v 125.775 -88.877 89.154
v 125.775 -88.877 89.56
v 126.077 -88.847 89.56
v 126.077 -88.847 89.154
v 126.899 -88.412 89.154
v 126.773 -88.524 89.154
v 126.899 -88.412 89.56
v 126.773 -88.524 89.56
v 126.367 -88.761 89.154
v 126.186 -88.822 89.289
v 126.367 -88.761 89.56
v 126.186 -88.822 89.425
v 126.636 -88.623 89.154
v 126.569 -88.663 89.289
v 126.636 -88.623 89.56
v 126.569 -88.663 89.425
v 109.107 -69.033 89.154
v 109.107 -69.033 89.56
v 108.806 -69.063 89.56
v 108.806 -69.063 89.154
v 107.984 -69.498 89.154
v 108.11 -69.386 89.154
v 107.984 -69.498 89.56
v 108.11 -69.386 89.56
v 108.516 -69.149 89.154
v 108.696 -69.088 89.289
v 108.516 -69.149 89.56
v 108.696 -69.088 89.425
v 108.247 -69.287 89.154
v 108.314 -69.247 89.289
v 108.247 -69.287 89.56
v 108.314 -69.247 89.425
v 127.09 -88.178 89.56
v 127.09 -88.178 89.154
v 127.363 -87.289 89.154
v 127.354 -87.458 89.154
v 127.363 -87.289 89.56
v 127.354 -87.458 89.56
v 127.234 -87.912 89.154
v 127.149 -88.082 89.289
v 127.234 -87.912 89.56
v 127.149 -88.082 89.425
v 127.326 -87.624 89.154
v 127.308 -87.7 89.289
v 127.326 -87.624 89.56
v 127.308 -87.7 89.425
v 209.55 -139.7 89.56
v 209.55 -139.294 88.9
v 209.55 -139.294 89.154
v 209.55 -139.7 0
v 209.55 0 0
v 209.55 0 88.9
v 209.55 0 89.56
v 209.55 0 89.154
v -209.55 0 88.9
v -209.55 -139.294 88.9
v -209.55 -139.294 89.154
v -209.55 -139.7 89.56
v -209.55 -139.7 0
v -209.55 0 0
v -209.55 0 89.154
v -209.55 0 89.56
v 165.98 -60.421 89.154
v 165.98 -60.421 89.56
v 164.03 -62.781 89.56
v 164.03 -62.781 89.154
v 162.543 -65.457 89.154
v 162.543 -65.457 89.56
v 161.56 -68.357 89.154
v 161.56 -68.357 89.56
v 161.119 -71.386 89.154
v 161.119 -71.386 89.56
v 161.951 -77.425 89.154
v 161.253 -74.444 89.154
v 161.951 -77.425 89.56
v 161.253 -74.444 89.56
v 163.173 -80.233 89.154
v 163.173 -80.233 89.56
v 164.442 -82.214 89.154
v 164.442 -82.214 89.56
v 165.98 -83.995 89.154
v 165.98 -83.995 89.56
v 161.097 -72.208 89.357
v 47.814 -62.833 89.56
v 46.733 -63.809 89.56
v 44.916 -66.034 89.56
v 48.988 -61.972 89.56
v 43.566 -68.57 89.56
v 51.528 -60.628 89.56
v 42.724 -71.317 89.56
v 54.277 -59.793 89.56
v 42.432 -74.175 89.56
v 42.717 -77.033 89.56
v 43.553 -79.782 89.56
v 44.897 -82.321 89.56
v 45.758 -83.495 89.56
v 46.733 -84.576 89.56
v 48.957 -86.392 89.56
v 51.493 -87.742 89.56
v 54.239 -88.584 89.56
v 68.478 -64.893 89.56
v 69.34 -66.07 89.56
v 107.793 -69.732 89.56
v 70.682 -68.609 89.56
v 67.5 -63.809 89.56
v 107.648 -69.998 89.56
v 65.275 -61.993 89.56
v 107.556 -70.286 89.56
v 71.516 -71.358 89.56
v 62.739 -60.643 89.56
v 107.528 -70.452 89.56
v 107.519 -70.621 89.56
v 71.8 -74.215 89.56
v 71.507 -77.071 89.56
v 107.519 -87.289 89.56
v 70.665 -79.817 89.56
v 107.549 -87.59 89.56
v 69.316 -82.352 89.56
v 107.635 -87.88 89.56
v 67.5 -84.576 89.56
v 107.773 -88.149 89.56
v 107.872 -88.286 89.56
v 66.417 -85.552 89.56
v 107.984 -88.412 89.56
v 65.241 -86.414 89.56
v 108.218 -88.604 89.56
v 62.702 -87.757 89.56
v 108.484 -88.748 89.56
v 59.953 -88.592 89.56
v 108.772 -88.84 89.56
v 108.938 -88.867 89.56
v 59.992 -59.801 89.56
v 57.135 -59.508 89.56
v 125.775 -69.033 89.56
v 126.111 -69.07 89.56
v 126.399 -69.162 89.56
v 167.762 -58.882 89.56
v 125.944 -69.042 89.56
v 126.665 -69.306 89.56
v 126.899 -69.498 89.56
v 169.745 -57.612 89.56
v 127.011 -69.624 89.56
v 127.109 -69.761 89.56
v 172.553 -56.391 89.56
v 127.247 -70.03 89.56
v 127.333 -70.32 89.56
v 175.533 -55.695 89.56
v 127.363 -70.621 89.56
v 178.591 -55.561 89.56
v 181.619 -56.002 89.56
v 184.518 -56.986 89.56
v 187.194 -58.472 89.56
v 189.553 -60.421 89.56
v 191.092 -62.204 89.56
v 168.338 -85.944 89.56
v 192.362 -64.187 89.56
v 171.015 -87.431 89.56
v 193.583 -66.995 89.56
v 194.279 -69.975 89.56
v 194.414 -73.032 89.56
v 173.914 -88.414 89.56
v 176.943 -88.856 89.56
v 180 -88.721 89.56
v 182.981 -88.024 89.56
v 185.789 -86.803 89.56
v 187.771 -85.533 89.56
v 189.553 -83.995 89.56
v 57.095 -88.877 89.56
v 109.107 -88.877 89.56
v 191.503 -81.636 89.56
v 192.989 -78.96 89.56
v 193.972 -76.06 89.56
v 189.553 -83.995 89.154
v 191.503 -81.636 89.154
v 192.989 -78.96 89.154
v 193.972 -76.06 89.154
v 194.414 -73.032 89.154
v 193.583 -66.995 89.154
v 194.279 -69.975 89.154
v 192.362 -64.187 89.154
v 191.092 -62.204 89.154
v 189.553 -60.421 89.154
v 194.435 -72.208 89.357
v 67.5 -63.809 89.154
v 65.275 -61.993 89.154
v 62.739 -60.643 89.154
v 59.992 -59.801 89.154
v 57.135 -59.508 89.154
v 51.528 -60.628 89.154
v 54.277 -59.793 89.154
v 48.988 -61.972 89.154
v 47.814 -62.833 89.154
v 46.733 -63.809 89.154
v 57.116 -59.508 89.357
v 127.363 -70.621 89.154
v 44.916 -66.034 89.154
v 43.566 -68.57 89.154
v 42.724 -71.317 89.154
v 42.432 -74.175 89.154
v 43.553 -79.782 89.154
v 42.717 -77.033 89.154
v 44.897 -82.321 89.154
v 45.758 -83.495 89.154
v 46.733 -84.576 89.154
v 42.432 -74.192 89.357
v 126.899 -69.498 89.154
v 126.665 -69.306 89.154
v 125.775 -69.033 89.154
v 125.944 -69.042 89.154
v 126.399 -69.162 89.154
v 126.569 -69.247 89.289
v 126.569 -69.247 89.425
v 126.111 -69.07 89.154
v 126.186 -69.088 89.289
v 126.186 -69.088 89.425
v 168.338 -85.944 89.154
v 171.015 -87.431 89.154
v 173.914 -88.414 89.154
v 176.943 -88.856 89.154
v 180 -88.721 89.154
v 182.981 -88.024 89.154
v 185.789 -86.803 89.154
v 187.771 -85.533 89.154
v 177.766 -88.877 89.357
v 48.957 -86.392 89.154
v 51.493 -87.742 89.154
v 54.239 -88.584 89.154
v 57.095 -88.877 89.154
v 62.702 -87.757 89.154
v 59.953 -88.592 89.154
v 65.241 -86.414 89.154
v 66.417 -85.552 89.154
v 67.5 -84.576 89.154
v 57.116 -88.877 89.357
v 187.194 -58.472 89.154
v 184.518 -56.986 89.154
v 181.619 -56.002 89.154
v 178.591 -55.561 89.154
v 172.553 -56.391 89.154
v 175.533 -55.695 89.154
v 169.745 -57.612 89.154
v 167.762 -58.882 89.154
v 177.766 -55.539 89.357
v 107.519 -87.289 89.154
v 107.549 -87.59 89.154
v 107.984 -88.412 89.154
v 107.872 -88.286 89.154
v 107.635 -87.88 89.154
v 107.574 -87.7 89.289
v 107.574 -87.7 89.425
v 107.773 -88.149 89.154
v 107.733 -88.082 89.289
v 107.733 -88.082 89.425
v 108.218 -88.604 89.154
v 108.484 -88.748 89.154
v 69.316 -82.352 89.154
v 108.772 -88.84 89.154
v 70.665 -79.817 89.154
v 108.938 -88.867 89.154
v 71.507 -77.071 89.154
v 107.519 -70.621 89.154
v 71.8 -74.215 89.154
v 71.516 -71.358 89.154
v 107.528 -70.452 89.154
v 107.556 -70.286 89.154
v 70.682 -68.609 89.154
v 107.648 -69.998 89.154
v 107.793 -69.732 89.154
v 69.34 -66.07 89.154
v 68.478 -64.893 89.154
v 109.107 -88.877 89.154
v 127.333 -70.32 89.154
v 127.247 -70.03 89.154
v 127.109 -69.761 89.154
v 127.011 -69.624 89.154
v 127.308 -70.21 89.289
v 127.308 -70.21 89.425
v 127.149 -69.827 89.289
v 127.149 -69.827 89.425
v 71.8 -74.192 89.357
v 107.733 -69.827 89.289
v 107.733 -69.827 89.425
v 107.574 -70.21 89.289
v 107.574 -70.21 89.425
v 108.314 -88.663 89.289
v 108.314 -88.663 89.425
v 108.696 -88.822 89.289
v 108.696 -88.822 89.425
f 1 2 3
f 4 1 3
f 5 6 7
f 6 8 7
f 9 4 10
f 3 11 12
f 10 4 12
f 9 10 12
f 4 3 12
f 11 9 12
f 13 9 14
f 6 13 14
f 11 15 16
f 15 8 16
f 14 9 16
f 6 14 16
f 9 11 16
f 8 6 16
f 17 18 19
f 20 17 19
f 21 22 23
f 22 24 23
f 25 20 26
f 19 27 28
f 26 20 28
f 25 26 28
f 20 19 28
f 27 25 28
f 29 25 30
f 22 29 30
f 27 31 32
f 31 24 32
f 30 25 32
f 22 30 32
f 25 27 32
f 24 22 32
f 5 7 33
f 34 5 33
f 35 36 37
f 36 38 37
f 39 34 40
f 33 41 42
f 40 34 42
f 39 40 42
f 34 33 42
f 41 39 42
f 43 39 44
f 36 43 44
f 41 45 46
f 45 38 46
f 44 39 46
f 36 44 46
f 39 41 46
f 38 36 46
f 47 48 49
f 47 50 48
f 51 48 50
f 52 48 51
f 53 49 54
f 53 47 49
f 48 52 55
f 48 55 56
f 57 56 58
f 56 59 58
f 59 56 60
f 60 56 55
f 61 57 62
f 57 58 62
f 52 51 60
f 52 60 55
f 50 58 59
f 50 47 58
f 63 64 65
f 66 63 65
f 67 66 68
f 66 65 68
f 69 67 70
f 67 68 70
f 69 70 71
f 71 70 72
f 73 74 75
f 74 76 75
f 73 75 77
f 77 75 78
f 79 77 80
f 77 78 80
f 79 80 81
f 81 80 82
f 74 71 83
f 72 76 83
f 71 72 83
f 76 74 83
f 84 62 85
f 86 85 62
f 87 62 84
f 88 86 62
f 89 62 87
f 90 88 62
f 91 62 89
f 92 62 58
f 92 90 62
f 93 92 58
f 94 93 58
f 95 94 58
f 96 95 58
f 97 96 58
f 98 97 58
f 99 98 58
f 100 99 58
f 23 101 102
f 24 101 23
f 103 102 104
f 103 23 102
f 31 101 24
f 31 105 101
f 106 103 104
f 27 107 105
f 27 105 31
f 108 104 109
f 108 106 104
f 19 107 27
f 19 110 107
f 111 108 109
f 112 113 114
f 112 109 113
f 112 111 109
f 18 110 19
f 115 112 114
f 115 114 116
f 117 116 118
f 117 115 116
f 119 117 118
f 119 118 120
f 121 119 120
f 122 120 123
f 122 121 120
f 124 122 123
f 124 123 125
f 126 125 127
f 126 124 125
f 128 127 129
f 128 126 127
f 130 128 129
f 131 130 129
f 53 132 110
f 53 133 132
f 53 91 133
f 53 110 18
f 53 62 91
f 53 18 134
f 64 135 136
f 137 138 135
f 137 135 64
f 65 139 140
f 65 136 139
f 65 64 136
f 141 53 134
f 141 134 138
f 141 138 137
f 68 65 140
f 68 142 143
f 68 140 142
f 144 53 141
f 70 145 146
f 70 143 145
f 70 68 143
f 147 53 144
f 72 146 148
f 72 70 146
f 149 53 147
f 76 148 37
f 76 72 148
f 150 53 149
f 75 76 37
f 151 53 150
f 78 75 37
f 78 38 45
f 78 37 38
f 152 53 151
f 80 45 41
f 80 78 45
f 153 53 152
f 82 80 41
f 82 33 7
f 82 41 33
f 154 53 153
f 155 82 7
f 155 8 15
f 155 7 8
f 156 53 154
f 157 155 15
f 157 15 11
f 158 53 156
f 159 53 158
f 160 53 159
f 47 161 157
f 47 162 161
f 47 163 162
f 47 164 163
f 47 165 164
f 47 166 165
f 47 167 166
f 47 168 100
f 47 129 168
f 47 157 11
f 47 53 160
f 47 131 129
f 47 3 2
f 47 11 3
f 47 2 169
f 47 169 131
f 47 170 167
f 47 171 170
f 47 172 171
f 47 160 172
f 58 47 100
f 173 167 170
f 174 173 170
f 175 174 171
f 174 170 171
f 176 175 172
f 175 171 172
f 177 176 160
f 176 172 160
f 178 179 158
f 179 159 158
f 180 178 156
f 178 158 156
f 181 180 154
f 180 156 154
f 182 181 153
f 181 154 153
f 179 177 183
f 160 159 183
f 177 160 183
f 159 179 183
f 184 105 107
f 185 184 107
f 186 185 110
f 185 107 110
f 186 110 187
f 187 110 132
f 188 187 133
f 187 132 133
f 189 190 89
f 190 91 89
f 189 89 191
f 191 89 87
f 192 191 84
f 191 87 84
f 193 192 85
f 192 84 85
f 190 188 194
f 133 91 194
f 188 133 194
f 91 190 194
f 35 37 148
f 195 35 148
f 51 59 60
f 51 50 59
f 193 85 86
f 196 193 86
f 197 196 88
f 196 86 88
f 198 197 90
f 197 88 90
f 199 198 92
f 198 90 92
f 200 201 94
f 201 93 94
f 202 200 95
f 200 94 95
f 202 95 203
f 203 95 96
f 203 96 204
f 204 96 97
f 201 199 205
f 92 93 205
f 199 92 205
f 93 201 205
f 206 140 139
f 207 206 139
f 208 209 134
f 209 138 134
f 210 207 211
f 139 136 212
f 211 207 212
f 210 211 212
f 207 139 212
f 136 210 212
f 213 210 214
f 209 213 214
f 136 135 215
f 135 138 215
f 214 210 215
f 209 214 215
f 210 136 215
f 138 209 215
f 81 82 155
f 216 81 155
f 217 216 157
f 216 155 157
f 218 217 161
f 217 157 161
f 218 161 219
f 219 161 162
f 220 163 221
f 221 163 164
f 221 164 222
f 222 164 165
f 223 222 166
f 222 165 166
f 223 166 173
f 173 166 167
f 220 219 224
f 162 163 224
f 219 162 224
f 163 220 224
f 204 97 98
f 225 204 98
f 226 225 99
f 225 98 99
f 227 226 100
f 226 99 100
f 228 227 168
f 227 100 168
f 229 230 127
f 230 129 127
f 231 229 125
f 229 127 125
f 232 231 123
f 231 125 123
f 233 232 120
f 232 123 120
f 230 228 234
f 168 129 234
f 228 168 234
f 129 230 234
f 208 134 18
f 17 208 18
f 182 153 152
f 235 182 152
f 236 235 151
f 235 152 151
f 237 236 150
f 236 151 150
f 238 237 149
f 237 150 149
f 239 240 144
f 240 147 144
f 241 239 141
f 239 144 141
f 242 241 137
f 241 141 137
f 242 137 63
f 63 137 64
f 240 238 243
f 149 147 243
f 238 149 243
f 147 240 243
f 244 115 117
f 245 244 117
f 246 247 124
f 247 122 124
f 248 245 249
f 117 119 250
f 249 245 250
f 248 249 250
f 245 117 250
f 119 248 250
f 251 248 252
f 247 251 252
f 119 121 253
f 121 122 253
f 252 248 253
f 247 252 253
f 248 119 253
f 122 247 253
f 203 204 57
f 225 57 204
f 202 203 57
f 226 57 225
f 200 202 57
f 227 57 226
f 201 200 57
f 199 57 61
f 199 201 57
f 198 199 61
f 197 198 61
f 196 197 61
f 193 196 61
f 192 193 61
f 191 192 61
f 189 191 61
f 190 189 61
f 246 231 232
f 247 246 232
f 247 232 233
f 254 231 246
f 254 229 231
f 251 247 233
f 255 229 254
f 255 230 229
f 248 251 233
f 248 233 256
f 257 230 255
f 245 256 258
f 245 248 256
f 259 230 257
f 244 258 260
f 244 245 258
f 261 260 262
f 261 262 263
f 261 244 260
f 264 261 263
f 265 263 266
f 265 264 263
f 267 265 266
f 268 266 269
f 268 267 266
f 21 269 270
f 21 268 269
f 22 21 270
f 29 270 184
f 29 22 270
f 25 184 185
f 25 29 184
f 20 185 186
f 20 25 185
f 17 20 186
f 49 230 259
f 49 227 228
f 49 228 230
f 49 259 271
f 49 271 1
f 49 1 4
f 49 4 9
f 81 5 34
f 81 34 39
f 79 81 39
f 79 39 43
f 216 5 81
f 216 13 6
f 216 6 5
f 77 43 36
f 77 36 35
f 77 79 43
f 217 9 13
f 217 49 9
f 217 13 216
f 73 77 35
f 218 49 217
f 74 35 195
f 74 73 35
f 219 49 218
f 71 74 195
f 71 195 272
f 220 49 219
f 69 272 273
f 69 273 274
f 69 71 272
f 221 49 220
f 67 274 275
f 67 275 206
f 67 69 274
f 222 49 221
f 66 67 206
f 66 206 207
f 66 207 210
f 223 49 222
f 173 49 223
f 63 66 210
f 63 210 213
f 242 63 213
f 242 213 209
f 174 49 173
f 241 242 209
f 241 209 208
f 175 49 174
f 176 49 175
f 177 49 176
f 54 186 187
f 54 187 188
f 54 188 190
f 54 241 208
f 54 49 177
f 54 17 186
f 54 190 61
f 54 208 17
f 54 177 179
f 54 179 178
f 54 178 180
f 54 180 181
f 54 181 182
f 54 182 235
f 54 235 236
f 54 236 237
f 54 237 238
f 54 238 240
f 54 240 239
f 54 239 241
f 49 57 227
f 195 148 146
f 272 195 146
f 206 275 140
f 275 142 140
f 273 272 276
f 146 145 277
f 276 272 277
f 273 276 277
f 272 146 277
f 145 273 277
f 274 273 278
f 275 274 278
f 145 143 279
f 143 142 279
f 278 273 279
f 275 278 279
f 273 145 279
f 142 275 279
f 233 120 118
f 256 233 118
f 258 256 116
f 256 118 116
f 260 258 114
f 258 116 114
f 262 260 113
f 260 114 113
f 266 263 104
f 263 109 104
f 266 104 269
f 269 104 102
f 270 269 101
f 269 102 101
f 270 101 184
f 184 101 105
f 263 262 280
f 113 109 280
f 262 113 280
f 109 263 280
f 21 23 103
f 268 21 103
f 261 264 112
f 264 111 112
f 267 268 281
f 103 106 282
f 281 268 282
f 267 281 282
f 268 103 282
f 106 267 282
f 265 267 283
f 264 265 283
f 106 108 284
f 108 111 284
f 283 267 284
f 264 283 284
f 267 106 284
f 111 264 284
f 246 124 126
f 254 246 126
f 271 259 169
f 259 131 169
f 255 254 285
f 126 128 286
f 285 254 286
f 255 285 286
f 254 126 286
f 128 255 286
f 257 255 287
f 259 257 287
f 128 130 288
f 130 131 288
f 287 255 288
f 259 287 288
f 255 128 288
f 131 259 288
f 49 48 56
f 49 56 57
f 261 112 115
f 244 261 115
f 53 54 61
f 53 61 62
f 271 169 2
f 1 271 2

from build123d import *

# Parameters (mm, degrees)
F1_DEPTH = 209.55
F3_DEPTH = 0.4064


# Not quite as in the source:
# - the dataset's text gives a spline's control points without its knots; the knots are read off the source's solid


with BuildPart() as f1:
    # F0 (on Right) → F1 (new body, symmetric)
    with BuildSketch(Plane.YZ):
        Polygon((-139.7, 0), (0, 0), (0, 88.9), (-139.2936, 88.9), (-139.2936, 89.154), (0, 89.154), (0, 89.5604), (-139.7, 89.5604), align=None)
    extrude(amount=F1_DEPTH, both=True)

    # F2 (on face) → F3 (cut, through all)
    with BuildSketch(Plane.XY.offset(89.5604)):
        with BuildLine():
            add(Edge.make_bspline(
                [(107.984345256, -69.4981747566), (107.690467256, -69.7918495566), (107.519068056, -70.2049297566), (107.519068056, -70.6205499566)],
                knots=[1, 1, 1, 1, 2, 2, 2, 2], degree=3))
            Line((107.519068056, -70.6205499566), (107.519068056, -87.2892999566))
            add(Edge.make_bspline(
                [(107.519068056, -87.2892999566), (107.519068056, -87.7047677566), (107.690467256, -88.1178479566), (107.984345256, -88.4117005566)],
                knots=[0, 0, 0, 0, 1, 1, 1, 1], degree=3))
            add(Edge.make_bspline(
                [(107.984345256, -88.4117005566), (108.278197856, -88.7055785566), (108.691278056, -88.8767999566), (109.106568056, -88.8767999566)],
                knots=[1, 1, 1, 1, 2, 2, 2, 2], degree=3))
            Line((109.106568056, -88.8767999566), (125.775318056, -88.8767999566))
            add(Edge.make_bspline(
                [(125.775318056, -88.8767999566), (126.191649456, -88.8767999566), (126.604374056, -88.7055785566), (126.898582256, -88.4117005566)],
                knots=[0, 0, 0, 0, 1, 1, 1, 1], degree=3))
            add(Edge.make_bspline(
                [(126.898582256, -88.4117005566), (127.192130056, -88.1178479566), (127.362818056, -87.7047677566), (127.362818056, -87.2892999566)],
                knots=[1, 1, 1, 1, 2, 2, 2, 2], degree=3))
            Line((127.362818056, -87.2892999566), (127.362818056, -70.6205499566))
            add(Edge.make_bspline(
                [(127.362818056, -70.6205499566), (127.362818056, -70.2049297566), (127.192130056, -69.7918495566), (126.898582256, -69.4981747566)],
                knots=[0, 0, 0, 0, 1, 1, 1, 1], degree=3))
            add(Edge.make_bspline(
                [(126.898582256, -69.4981747566), (126.604374056, -69.2041189566), (126.191649456, -69.0330499566), (125.775318056, -69.0330499566)],
                knots=[1, 1, 1, 1, 2, 2, 2, 2], degree=3))
            Line((125.775318056, -69.0330499566), (109.106568056, -69.0330499566))
            add(Edge.make_bspline(
                [(109.106568056, -69.0330499566), (108.691278056, -69.0330499566), (108.278197856, -69.2041189566), (107.984345256, -69.4981747566)],
                knots=[0, 0, 0, 0, 1, 1, 1, 1], degree=3))
        make_face()
        with BuildLine():
            add(Edge.make_bspline(
                [(67.499971056, -63.8087525566), (64.781434456, -61.0905461566), (60.960512456, -59.5080753566), (57.115943056, -59.5080753566)],
                knots=[7, 7, 7, 7, 8, 8, 8, 8], degree=3))
            add(Edge.make_bspline(
                [(57.115943056, -59.5080753566), (53.272059456, -59.5080753566), (49.451137456, -61.0905461566), (46.732931056, -63.8087525566)],
                knots=[0, 0, 0, 0, 1, 1, 1, 1], degree=3))
            add(Edge.make_bspline(
                [(46.732931056, -63.8087525566), (44.014445256, -66.5272891566), (42.431568056, -70.3477285566), (42.431568056, -74.1924249566), (42.431568056, -78.0366641566), (44.014445256, -81.8574083566), (46.732931056, -84.5756147566)],
                knots=[1, 1, 1, 1, 2, 2, 2, 3, 3, 3, 3], degree=3))
            add(Edge.make_bspline(
                [(46.732931056, -84.5756147566), (49.451137456, -87.2941513566), (53.272059456, -88.8767999566), (57.115943056, -88.8767999566), (60.960512456, -88.8767999566), (64.781434456, -87.2941513566), (67.499971056, -84.5756147566)],
                knots=[3, 3, 3, 3, 4, 4, 4, 5, 5, 5, 5], degree=3))
            add(Edge.make_bspline(
                [(67.499971056, -84.5756147566), (70.218533056, -81.8574083566), (71.800318056, -78.0366641566), (71.800318056, -74.1924249566), (71.800318056, -70.3477285566), (70.218533056, -66.5272891566), (67.499971056, -63.8087525566)],
                knots=[5, 5, 5, 5, 6, 6, 6, 7, 7, 7, 7], degree=3))
        make_face()
        with BuildLine():
            add(Edge.make_bspline(
                [(189.552838456, -60.4213577566), (186.467068656, -57.3355879566), (182.129993256, -55.5393253566), (177.766120856, -55.5393253566)],
                knots=[7, 7, 7, 7, 8, 8, 8, 8], degree=3))
            add(Edge.make_bspline(
                [(177.766120856, -55.5393253566), (173.402223056, -55.5393253566), (169.065198456, -57.3355879566), (165.979758856, -60.4213577566)],
                knots=[0, 0, 0, 0, 1, 1, 1, 1], degree=3))
            add(Edge.make_bspline(
                [(165.979758856, -60.4213577566), (162.894344656, -63.5071275566), (161.097370856, -67.8441775566), (161.097370856, -72.2080499566), (161.097370856, -76.5719477566), (162.894344656, -80.9089977566), (165.979758856, -83.9947675566)],
                knots=[1, 1, 1, 1, 2, 2, 2, 3, 3, 3, 3], degree=3))
            add(Edge.make_bspline(
                [(165.979758856, -83.9947675566), (169.065198456, -87.0801817566), (173.402223056, -88.8767999566), (177.766120856, -88.8767999566), (182.129993256, -88.8767999566), (186.467068656, -87.0801817566), (189.552838456, -83.9947675566)],
                knots=[3, 3, 3, 3, 4, 4, 4, 5, 5, 5, 5], degree=3))
            add(Edge.make_bspline(
                [(189.552838456, -83.9947675566), (192.638582856, -80.9089977566), (194.434870856, -76.5719477566), (194.434870856, -72.2080499566), (194.434870856, -67.8441775566), (192.638582856, -63.5071275566), (189.552838456, -60.4213577566)],
                knots=[5, 5, 5, 5, 6, 6, 6, 7, 7, 7, 7], degree=3))
        make_face()
    extrude(amount=-F3_DEPTH, mode=Mode.SUBTRACT)


solid = f1.part
